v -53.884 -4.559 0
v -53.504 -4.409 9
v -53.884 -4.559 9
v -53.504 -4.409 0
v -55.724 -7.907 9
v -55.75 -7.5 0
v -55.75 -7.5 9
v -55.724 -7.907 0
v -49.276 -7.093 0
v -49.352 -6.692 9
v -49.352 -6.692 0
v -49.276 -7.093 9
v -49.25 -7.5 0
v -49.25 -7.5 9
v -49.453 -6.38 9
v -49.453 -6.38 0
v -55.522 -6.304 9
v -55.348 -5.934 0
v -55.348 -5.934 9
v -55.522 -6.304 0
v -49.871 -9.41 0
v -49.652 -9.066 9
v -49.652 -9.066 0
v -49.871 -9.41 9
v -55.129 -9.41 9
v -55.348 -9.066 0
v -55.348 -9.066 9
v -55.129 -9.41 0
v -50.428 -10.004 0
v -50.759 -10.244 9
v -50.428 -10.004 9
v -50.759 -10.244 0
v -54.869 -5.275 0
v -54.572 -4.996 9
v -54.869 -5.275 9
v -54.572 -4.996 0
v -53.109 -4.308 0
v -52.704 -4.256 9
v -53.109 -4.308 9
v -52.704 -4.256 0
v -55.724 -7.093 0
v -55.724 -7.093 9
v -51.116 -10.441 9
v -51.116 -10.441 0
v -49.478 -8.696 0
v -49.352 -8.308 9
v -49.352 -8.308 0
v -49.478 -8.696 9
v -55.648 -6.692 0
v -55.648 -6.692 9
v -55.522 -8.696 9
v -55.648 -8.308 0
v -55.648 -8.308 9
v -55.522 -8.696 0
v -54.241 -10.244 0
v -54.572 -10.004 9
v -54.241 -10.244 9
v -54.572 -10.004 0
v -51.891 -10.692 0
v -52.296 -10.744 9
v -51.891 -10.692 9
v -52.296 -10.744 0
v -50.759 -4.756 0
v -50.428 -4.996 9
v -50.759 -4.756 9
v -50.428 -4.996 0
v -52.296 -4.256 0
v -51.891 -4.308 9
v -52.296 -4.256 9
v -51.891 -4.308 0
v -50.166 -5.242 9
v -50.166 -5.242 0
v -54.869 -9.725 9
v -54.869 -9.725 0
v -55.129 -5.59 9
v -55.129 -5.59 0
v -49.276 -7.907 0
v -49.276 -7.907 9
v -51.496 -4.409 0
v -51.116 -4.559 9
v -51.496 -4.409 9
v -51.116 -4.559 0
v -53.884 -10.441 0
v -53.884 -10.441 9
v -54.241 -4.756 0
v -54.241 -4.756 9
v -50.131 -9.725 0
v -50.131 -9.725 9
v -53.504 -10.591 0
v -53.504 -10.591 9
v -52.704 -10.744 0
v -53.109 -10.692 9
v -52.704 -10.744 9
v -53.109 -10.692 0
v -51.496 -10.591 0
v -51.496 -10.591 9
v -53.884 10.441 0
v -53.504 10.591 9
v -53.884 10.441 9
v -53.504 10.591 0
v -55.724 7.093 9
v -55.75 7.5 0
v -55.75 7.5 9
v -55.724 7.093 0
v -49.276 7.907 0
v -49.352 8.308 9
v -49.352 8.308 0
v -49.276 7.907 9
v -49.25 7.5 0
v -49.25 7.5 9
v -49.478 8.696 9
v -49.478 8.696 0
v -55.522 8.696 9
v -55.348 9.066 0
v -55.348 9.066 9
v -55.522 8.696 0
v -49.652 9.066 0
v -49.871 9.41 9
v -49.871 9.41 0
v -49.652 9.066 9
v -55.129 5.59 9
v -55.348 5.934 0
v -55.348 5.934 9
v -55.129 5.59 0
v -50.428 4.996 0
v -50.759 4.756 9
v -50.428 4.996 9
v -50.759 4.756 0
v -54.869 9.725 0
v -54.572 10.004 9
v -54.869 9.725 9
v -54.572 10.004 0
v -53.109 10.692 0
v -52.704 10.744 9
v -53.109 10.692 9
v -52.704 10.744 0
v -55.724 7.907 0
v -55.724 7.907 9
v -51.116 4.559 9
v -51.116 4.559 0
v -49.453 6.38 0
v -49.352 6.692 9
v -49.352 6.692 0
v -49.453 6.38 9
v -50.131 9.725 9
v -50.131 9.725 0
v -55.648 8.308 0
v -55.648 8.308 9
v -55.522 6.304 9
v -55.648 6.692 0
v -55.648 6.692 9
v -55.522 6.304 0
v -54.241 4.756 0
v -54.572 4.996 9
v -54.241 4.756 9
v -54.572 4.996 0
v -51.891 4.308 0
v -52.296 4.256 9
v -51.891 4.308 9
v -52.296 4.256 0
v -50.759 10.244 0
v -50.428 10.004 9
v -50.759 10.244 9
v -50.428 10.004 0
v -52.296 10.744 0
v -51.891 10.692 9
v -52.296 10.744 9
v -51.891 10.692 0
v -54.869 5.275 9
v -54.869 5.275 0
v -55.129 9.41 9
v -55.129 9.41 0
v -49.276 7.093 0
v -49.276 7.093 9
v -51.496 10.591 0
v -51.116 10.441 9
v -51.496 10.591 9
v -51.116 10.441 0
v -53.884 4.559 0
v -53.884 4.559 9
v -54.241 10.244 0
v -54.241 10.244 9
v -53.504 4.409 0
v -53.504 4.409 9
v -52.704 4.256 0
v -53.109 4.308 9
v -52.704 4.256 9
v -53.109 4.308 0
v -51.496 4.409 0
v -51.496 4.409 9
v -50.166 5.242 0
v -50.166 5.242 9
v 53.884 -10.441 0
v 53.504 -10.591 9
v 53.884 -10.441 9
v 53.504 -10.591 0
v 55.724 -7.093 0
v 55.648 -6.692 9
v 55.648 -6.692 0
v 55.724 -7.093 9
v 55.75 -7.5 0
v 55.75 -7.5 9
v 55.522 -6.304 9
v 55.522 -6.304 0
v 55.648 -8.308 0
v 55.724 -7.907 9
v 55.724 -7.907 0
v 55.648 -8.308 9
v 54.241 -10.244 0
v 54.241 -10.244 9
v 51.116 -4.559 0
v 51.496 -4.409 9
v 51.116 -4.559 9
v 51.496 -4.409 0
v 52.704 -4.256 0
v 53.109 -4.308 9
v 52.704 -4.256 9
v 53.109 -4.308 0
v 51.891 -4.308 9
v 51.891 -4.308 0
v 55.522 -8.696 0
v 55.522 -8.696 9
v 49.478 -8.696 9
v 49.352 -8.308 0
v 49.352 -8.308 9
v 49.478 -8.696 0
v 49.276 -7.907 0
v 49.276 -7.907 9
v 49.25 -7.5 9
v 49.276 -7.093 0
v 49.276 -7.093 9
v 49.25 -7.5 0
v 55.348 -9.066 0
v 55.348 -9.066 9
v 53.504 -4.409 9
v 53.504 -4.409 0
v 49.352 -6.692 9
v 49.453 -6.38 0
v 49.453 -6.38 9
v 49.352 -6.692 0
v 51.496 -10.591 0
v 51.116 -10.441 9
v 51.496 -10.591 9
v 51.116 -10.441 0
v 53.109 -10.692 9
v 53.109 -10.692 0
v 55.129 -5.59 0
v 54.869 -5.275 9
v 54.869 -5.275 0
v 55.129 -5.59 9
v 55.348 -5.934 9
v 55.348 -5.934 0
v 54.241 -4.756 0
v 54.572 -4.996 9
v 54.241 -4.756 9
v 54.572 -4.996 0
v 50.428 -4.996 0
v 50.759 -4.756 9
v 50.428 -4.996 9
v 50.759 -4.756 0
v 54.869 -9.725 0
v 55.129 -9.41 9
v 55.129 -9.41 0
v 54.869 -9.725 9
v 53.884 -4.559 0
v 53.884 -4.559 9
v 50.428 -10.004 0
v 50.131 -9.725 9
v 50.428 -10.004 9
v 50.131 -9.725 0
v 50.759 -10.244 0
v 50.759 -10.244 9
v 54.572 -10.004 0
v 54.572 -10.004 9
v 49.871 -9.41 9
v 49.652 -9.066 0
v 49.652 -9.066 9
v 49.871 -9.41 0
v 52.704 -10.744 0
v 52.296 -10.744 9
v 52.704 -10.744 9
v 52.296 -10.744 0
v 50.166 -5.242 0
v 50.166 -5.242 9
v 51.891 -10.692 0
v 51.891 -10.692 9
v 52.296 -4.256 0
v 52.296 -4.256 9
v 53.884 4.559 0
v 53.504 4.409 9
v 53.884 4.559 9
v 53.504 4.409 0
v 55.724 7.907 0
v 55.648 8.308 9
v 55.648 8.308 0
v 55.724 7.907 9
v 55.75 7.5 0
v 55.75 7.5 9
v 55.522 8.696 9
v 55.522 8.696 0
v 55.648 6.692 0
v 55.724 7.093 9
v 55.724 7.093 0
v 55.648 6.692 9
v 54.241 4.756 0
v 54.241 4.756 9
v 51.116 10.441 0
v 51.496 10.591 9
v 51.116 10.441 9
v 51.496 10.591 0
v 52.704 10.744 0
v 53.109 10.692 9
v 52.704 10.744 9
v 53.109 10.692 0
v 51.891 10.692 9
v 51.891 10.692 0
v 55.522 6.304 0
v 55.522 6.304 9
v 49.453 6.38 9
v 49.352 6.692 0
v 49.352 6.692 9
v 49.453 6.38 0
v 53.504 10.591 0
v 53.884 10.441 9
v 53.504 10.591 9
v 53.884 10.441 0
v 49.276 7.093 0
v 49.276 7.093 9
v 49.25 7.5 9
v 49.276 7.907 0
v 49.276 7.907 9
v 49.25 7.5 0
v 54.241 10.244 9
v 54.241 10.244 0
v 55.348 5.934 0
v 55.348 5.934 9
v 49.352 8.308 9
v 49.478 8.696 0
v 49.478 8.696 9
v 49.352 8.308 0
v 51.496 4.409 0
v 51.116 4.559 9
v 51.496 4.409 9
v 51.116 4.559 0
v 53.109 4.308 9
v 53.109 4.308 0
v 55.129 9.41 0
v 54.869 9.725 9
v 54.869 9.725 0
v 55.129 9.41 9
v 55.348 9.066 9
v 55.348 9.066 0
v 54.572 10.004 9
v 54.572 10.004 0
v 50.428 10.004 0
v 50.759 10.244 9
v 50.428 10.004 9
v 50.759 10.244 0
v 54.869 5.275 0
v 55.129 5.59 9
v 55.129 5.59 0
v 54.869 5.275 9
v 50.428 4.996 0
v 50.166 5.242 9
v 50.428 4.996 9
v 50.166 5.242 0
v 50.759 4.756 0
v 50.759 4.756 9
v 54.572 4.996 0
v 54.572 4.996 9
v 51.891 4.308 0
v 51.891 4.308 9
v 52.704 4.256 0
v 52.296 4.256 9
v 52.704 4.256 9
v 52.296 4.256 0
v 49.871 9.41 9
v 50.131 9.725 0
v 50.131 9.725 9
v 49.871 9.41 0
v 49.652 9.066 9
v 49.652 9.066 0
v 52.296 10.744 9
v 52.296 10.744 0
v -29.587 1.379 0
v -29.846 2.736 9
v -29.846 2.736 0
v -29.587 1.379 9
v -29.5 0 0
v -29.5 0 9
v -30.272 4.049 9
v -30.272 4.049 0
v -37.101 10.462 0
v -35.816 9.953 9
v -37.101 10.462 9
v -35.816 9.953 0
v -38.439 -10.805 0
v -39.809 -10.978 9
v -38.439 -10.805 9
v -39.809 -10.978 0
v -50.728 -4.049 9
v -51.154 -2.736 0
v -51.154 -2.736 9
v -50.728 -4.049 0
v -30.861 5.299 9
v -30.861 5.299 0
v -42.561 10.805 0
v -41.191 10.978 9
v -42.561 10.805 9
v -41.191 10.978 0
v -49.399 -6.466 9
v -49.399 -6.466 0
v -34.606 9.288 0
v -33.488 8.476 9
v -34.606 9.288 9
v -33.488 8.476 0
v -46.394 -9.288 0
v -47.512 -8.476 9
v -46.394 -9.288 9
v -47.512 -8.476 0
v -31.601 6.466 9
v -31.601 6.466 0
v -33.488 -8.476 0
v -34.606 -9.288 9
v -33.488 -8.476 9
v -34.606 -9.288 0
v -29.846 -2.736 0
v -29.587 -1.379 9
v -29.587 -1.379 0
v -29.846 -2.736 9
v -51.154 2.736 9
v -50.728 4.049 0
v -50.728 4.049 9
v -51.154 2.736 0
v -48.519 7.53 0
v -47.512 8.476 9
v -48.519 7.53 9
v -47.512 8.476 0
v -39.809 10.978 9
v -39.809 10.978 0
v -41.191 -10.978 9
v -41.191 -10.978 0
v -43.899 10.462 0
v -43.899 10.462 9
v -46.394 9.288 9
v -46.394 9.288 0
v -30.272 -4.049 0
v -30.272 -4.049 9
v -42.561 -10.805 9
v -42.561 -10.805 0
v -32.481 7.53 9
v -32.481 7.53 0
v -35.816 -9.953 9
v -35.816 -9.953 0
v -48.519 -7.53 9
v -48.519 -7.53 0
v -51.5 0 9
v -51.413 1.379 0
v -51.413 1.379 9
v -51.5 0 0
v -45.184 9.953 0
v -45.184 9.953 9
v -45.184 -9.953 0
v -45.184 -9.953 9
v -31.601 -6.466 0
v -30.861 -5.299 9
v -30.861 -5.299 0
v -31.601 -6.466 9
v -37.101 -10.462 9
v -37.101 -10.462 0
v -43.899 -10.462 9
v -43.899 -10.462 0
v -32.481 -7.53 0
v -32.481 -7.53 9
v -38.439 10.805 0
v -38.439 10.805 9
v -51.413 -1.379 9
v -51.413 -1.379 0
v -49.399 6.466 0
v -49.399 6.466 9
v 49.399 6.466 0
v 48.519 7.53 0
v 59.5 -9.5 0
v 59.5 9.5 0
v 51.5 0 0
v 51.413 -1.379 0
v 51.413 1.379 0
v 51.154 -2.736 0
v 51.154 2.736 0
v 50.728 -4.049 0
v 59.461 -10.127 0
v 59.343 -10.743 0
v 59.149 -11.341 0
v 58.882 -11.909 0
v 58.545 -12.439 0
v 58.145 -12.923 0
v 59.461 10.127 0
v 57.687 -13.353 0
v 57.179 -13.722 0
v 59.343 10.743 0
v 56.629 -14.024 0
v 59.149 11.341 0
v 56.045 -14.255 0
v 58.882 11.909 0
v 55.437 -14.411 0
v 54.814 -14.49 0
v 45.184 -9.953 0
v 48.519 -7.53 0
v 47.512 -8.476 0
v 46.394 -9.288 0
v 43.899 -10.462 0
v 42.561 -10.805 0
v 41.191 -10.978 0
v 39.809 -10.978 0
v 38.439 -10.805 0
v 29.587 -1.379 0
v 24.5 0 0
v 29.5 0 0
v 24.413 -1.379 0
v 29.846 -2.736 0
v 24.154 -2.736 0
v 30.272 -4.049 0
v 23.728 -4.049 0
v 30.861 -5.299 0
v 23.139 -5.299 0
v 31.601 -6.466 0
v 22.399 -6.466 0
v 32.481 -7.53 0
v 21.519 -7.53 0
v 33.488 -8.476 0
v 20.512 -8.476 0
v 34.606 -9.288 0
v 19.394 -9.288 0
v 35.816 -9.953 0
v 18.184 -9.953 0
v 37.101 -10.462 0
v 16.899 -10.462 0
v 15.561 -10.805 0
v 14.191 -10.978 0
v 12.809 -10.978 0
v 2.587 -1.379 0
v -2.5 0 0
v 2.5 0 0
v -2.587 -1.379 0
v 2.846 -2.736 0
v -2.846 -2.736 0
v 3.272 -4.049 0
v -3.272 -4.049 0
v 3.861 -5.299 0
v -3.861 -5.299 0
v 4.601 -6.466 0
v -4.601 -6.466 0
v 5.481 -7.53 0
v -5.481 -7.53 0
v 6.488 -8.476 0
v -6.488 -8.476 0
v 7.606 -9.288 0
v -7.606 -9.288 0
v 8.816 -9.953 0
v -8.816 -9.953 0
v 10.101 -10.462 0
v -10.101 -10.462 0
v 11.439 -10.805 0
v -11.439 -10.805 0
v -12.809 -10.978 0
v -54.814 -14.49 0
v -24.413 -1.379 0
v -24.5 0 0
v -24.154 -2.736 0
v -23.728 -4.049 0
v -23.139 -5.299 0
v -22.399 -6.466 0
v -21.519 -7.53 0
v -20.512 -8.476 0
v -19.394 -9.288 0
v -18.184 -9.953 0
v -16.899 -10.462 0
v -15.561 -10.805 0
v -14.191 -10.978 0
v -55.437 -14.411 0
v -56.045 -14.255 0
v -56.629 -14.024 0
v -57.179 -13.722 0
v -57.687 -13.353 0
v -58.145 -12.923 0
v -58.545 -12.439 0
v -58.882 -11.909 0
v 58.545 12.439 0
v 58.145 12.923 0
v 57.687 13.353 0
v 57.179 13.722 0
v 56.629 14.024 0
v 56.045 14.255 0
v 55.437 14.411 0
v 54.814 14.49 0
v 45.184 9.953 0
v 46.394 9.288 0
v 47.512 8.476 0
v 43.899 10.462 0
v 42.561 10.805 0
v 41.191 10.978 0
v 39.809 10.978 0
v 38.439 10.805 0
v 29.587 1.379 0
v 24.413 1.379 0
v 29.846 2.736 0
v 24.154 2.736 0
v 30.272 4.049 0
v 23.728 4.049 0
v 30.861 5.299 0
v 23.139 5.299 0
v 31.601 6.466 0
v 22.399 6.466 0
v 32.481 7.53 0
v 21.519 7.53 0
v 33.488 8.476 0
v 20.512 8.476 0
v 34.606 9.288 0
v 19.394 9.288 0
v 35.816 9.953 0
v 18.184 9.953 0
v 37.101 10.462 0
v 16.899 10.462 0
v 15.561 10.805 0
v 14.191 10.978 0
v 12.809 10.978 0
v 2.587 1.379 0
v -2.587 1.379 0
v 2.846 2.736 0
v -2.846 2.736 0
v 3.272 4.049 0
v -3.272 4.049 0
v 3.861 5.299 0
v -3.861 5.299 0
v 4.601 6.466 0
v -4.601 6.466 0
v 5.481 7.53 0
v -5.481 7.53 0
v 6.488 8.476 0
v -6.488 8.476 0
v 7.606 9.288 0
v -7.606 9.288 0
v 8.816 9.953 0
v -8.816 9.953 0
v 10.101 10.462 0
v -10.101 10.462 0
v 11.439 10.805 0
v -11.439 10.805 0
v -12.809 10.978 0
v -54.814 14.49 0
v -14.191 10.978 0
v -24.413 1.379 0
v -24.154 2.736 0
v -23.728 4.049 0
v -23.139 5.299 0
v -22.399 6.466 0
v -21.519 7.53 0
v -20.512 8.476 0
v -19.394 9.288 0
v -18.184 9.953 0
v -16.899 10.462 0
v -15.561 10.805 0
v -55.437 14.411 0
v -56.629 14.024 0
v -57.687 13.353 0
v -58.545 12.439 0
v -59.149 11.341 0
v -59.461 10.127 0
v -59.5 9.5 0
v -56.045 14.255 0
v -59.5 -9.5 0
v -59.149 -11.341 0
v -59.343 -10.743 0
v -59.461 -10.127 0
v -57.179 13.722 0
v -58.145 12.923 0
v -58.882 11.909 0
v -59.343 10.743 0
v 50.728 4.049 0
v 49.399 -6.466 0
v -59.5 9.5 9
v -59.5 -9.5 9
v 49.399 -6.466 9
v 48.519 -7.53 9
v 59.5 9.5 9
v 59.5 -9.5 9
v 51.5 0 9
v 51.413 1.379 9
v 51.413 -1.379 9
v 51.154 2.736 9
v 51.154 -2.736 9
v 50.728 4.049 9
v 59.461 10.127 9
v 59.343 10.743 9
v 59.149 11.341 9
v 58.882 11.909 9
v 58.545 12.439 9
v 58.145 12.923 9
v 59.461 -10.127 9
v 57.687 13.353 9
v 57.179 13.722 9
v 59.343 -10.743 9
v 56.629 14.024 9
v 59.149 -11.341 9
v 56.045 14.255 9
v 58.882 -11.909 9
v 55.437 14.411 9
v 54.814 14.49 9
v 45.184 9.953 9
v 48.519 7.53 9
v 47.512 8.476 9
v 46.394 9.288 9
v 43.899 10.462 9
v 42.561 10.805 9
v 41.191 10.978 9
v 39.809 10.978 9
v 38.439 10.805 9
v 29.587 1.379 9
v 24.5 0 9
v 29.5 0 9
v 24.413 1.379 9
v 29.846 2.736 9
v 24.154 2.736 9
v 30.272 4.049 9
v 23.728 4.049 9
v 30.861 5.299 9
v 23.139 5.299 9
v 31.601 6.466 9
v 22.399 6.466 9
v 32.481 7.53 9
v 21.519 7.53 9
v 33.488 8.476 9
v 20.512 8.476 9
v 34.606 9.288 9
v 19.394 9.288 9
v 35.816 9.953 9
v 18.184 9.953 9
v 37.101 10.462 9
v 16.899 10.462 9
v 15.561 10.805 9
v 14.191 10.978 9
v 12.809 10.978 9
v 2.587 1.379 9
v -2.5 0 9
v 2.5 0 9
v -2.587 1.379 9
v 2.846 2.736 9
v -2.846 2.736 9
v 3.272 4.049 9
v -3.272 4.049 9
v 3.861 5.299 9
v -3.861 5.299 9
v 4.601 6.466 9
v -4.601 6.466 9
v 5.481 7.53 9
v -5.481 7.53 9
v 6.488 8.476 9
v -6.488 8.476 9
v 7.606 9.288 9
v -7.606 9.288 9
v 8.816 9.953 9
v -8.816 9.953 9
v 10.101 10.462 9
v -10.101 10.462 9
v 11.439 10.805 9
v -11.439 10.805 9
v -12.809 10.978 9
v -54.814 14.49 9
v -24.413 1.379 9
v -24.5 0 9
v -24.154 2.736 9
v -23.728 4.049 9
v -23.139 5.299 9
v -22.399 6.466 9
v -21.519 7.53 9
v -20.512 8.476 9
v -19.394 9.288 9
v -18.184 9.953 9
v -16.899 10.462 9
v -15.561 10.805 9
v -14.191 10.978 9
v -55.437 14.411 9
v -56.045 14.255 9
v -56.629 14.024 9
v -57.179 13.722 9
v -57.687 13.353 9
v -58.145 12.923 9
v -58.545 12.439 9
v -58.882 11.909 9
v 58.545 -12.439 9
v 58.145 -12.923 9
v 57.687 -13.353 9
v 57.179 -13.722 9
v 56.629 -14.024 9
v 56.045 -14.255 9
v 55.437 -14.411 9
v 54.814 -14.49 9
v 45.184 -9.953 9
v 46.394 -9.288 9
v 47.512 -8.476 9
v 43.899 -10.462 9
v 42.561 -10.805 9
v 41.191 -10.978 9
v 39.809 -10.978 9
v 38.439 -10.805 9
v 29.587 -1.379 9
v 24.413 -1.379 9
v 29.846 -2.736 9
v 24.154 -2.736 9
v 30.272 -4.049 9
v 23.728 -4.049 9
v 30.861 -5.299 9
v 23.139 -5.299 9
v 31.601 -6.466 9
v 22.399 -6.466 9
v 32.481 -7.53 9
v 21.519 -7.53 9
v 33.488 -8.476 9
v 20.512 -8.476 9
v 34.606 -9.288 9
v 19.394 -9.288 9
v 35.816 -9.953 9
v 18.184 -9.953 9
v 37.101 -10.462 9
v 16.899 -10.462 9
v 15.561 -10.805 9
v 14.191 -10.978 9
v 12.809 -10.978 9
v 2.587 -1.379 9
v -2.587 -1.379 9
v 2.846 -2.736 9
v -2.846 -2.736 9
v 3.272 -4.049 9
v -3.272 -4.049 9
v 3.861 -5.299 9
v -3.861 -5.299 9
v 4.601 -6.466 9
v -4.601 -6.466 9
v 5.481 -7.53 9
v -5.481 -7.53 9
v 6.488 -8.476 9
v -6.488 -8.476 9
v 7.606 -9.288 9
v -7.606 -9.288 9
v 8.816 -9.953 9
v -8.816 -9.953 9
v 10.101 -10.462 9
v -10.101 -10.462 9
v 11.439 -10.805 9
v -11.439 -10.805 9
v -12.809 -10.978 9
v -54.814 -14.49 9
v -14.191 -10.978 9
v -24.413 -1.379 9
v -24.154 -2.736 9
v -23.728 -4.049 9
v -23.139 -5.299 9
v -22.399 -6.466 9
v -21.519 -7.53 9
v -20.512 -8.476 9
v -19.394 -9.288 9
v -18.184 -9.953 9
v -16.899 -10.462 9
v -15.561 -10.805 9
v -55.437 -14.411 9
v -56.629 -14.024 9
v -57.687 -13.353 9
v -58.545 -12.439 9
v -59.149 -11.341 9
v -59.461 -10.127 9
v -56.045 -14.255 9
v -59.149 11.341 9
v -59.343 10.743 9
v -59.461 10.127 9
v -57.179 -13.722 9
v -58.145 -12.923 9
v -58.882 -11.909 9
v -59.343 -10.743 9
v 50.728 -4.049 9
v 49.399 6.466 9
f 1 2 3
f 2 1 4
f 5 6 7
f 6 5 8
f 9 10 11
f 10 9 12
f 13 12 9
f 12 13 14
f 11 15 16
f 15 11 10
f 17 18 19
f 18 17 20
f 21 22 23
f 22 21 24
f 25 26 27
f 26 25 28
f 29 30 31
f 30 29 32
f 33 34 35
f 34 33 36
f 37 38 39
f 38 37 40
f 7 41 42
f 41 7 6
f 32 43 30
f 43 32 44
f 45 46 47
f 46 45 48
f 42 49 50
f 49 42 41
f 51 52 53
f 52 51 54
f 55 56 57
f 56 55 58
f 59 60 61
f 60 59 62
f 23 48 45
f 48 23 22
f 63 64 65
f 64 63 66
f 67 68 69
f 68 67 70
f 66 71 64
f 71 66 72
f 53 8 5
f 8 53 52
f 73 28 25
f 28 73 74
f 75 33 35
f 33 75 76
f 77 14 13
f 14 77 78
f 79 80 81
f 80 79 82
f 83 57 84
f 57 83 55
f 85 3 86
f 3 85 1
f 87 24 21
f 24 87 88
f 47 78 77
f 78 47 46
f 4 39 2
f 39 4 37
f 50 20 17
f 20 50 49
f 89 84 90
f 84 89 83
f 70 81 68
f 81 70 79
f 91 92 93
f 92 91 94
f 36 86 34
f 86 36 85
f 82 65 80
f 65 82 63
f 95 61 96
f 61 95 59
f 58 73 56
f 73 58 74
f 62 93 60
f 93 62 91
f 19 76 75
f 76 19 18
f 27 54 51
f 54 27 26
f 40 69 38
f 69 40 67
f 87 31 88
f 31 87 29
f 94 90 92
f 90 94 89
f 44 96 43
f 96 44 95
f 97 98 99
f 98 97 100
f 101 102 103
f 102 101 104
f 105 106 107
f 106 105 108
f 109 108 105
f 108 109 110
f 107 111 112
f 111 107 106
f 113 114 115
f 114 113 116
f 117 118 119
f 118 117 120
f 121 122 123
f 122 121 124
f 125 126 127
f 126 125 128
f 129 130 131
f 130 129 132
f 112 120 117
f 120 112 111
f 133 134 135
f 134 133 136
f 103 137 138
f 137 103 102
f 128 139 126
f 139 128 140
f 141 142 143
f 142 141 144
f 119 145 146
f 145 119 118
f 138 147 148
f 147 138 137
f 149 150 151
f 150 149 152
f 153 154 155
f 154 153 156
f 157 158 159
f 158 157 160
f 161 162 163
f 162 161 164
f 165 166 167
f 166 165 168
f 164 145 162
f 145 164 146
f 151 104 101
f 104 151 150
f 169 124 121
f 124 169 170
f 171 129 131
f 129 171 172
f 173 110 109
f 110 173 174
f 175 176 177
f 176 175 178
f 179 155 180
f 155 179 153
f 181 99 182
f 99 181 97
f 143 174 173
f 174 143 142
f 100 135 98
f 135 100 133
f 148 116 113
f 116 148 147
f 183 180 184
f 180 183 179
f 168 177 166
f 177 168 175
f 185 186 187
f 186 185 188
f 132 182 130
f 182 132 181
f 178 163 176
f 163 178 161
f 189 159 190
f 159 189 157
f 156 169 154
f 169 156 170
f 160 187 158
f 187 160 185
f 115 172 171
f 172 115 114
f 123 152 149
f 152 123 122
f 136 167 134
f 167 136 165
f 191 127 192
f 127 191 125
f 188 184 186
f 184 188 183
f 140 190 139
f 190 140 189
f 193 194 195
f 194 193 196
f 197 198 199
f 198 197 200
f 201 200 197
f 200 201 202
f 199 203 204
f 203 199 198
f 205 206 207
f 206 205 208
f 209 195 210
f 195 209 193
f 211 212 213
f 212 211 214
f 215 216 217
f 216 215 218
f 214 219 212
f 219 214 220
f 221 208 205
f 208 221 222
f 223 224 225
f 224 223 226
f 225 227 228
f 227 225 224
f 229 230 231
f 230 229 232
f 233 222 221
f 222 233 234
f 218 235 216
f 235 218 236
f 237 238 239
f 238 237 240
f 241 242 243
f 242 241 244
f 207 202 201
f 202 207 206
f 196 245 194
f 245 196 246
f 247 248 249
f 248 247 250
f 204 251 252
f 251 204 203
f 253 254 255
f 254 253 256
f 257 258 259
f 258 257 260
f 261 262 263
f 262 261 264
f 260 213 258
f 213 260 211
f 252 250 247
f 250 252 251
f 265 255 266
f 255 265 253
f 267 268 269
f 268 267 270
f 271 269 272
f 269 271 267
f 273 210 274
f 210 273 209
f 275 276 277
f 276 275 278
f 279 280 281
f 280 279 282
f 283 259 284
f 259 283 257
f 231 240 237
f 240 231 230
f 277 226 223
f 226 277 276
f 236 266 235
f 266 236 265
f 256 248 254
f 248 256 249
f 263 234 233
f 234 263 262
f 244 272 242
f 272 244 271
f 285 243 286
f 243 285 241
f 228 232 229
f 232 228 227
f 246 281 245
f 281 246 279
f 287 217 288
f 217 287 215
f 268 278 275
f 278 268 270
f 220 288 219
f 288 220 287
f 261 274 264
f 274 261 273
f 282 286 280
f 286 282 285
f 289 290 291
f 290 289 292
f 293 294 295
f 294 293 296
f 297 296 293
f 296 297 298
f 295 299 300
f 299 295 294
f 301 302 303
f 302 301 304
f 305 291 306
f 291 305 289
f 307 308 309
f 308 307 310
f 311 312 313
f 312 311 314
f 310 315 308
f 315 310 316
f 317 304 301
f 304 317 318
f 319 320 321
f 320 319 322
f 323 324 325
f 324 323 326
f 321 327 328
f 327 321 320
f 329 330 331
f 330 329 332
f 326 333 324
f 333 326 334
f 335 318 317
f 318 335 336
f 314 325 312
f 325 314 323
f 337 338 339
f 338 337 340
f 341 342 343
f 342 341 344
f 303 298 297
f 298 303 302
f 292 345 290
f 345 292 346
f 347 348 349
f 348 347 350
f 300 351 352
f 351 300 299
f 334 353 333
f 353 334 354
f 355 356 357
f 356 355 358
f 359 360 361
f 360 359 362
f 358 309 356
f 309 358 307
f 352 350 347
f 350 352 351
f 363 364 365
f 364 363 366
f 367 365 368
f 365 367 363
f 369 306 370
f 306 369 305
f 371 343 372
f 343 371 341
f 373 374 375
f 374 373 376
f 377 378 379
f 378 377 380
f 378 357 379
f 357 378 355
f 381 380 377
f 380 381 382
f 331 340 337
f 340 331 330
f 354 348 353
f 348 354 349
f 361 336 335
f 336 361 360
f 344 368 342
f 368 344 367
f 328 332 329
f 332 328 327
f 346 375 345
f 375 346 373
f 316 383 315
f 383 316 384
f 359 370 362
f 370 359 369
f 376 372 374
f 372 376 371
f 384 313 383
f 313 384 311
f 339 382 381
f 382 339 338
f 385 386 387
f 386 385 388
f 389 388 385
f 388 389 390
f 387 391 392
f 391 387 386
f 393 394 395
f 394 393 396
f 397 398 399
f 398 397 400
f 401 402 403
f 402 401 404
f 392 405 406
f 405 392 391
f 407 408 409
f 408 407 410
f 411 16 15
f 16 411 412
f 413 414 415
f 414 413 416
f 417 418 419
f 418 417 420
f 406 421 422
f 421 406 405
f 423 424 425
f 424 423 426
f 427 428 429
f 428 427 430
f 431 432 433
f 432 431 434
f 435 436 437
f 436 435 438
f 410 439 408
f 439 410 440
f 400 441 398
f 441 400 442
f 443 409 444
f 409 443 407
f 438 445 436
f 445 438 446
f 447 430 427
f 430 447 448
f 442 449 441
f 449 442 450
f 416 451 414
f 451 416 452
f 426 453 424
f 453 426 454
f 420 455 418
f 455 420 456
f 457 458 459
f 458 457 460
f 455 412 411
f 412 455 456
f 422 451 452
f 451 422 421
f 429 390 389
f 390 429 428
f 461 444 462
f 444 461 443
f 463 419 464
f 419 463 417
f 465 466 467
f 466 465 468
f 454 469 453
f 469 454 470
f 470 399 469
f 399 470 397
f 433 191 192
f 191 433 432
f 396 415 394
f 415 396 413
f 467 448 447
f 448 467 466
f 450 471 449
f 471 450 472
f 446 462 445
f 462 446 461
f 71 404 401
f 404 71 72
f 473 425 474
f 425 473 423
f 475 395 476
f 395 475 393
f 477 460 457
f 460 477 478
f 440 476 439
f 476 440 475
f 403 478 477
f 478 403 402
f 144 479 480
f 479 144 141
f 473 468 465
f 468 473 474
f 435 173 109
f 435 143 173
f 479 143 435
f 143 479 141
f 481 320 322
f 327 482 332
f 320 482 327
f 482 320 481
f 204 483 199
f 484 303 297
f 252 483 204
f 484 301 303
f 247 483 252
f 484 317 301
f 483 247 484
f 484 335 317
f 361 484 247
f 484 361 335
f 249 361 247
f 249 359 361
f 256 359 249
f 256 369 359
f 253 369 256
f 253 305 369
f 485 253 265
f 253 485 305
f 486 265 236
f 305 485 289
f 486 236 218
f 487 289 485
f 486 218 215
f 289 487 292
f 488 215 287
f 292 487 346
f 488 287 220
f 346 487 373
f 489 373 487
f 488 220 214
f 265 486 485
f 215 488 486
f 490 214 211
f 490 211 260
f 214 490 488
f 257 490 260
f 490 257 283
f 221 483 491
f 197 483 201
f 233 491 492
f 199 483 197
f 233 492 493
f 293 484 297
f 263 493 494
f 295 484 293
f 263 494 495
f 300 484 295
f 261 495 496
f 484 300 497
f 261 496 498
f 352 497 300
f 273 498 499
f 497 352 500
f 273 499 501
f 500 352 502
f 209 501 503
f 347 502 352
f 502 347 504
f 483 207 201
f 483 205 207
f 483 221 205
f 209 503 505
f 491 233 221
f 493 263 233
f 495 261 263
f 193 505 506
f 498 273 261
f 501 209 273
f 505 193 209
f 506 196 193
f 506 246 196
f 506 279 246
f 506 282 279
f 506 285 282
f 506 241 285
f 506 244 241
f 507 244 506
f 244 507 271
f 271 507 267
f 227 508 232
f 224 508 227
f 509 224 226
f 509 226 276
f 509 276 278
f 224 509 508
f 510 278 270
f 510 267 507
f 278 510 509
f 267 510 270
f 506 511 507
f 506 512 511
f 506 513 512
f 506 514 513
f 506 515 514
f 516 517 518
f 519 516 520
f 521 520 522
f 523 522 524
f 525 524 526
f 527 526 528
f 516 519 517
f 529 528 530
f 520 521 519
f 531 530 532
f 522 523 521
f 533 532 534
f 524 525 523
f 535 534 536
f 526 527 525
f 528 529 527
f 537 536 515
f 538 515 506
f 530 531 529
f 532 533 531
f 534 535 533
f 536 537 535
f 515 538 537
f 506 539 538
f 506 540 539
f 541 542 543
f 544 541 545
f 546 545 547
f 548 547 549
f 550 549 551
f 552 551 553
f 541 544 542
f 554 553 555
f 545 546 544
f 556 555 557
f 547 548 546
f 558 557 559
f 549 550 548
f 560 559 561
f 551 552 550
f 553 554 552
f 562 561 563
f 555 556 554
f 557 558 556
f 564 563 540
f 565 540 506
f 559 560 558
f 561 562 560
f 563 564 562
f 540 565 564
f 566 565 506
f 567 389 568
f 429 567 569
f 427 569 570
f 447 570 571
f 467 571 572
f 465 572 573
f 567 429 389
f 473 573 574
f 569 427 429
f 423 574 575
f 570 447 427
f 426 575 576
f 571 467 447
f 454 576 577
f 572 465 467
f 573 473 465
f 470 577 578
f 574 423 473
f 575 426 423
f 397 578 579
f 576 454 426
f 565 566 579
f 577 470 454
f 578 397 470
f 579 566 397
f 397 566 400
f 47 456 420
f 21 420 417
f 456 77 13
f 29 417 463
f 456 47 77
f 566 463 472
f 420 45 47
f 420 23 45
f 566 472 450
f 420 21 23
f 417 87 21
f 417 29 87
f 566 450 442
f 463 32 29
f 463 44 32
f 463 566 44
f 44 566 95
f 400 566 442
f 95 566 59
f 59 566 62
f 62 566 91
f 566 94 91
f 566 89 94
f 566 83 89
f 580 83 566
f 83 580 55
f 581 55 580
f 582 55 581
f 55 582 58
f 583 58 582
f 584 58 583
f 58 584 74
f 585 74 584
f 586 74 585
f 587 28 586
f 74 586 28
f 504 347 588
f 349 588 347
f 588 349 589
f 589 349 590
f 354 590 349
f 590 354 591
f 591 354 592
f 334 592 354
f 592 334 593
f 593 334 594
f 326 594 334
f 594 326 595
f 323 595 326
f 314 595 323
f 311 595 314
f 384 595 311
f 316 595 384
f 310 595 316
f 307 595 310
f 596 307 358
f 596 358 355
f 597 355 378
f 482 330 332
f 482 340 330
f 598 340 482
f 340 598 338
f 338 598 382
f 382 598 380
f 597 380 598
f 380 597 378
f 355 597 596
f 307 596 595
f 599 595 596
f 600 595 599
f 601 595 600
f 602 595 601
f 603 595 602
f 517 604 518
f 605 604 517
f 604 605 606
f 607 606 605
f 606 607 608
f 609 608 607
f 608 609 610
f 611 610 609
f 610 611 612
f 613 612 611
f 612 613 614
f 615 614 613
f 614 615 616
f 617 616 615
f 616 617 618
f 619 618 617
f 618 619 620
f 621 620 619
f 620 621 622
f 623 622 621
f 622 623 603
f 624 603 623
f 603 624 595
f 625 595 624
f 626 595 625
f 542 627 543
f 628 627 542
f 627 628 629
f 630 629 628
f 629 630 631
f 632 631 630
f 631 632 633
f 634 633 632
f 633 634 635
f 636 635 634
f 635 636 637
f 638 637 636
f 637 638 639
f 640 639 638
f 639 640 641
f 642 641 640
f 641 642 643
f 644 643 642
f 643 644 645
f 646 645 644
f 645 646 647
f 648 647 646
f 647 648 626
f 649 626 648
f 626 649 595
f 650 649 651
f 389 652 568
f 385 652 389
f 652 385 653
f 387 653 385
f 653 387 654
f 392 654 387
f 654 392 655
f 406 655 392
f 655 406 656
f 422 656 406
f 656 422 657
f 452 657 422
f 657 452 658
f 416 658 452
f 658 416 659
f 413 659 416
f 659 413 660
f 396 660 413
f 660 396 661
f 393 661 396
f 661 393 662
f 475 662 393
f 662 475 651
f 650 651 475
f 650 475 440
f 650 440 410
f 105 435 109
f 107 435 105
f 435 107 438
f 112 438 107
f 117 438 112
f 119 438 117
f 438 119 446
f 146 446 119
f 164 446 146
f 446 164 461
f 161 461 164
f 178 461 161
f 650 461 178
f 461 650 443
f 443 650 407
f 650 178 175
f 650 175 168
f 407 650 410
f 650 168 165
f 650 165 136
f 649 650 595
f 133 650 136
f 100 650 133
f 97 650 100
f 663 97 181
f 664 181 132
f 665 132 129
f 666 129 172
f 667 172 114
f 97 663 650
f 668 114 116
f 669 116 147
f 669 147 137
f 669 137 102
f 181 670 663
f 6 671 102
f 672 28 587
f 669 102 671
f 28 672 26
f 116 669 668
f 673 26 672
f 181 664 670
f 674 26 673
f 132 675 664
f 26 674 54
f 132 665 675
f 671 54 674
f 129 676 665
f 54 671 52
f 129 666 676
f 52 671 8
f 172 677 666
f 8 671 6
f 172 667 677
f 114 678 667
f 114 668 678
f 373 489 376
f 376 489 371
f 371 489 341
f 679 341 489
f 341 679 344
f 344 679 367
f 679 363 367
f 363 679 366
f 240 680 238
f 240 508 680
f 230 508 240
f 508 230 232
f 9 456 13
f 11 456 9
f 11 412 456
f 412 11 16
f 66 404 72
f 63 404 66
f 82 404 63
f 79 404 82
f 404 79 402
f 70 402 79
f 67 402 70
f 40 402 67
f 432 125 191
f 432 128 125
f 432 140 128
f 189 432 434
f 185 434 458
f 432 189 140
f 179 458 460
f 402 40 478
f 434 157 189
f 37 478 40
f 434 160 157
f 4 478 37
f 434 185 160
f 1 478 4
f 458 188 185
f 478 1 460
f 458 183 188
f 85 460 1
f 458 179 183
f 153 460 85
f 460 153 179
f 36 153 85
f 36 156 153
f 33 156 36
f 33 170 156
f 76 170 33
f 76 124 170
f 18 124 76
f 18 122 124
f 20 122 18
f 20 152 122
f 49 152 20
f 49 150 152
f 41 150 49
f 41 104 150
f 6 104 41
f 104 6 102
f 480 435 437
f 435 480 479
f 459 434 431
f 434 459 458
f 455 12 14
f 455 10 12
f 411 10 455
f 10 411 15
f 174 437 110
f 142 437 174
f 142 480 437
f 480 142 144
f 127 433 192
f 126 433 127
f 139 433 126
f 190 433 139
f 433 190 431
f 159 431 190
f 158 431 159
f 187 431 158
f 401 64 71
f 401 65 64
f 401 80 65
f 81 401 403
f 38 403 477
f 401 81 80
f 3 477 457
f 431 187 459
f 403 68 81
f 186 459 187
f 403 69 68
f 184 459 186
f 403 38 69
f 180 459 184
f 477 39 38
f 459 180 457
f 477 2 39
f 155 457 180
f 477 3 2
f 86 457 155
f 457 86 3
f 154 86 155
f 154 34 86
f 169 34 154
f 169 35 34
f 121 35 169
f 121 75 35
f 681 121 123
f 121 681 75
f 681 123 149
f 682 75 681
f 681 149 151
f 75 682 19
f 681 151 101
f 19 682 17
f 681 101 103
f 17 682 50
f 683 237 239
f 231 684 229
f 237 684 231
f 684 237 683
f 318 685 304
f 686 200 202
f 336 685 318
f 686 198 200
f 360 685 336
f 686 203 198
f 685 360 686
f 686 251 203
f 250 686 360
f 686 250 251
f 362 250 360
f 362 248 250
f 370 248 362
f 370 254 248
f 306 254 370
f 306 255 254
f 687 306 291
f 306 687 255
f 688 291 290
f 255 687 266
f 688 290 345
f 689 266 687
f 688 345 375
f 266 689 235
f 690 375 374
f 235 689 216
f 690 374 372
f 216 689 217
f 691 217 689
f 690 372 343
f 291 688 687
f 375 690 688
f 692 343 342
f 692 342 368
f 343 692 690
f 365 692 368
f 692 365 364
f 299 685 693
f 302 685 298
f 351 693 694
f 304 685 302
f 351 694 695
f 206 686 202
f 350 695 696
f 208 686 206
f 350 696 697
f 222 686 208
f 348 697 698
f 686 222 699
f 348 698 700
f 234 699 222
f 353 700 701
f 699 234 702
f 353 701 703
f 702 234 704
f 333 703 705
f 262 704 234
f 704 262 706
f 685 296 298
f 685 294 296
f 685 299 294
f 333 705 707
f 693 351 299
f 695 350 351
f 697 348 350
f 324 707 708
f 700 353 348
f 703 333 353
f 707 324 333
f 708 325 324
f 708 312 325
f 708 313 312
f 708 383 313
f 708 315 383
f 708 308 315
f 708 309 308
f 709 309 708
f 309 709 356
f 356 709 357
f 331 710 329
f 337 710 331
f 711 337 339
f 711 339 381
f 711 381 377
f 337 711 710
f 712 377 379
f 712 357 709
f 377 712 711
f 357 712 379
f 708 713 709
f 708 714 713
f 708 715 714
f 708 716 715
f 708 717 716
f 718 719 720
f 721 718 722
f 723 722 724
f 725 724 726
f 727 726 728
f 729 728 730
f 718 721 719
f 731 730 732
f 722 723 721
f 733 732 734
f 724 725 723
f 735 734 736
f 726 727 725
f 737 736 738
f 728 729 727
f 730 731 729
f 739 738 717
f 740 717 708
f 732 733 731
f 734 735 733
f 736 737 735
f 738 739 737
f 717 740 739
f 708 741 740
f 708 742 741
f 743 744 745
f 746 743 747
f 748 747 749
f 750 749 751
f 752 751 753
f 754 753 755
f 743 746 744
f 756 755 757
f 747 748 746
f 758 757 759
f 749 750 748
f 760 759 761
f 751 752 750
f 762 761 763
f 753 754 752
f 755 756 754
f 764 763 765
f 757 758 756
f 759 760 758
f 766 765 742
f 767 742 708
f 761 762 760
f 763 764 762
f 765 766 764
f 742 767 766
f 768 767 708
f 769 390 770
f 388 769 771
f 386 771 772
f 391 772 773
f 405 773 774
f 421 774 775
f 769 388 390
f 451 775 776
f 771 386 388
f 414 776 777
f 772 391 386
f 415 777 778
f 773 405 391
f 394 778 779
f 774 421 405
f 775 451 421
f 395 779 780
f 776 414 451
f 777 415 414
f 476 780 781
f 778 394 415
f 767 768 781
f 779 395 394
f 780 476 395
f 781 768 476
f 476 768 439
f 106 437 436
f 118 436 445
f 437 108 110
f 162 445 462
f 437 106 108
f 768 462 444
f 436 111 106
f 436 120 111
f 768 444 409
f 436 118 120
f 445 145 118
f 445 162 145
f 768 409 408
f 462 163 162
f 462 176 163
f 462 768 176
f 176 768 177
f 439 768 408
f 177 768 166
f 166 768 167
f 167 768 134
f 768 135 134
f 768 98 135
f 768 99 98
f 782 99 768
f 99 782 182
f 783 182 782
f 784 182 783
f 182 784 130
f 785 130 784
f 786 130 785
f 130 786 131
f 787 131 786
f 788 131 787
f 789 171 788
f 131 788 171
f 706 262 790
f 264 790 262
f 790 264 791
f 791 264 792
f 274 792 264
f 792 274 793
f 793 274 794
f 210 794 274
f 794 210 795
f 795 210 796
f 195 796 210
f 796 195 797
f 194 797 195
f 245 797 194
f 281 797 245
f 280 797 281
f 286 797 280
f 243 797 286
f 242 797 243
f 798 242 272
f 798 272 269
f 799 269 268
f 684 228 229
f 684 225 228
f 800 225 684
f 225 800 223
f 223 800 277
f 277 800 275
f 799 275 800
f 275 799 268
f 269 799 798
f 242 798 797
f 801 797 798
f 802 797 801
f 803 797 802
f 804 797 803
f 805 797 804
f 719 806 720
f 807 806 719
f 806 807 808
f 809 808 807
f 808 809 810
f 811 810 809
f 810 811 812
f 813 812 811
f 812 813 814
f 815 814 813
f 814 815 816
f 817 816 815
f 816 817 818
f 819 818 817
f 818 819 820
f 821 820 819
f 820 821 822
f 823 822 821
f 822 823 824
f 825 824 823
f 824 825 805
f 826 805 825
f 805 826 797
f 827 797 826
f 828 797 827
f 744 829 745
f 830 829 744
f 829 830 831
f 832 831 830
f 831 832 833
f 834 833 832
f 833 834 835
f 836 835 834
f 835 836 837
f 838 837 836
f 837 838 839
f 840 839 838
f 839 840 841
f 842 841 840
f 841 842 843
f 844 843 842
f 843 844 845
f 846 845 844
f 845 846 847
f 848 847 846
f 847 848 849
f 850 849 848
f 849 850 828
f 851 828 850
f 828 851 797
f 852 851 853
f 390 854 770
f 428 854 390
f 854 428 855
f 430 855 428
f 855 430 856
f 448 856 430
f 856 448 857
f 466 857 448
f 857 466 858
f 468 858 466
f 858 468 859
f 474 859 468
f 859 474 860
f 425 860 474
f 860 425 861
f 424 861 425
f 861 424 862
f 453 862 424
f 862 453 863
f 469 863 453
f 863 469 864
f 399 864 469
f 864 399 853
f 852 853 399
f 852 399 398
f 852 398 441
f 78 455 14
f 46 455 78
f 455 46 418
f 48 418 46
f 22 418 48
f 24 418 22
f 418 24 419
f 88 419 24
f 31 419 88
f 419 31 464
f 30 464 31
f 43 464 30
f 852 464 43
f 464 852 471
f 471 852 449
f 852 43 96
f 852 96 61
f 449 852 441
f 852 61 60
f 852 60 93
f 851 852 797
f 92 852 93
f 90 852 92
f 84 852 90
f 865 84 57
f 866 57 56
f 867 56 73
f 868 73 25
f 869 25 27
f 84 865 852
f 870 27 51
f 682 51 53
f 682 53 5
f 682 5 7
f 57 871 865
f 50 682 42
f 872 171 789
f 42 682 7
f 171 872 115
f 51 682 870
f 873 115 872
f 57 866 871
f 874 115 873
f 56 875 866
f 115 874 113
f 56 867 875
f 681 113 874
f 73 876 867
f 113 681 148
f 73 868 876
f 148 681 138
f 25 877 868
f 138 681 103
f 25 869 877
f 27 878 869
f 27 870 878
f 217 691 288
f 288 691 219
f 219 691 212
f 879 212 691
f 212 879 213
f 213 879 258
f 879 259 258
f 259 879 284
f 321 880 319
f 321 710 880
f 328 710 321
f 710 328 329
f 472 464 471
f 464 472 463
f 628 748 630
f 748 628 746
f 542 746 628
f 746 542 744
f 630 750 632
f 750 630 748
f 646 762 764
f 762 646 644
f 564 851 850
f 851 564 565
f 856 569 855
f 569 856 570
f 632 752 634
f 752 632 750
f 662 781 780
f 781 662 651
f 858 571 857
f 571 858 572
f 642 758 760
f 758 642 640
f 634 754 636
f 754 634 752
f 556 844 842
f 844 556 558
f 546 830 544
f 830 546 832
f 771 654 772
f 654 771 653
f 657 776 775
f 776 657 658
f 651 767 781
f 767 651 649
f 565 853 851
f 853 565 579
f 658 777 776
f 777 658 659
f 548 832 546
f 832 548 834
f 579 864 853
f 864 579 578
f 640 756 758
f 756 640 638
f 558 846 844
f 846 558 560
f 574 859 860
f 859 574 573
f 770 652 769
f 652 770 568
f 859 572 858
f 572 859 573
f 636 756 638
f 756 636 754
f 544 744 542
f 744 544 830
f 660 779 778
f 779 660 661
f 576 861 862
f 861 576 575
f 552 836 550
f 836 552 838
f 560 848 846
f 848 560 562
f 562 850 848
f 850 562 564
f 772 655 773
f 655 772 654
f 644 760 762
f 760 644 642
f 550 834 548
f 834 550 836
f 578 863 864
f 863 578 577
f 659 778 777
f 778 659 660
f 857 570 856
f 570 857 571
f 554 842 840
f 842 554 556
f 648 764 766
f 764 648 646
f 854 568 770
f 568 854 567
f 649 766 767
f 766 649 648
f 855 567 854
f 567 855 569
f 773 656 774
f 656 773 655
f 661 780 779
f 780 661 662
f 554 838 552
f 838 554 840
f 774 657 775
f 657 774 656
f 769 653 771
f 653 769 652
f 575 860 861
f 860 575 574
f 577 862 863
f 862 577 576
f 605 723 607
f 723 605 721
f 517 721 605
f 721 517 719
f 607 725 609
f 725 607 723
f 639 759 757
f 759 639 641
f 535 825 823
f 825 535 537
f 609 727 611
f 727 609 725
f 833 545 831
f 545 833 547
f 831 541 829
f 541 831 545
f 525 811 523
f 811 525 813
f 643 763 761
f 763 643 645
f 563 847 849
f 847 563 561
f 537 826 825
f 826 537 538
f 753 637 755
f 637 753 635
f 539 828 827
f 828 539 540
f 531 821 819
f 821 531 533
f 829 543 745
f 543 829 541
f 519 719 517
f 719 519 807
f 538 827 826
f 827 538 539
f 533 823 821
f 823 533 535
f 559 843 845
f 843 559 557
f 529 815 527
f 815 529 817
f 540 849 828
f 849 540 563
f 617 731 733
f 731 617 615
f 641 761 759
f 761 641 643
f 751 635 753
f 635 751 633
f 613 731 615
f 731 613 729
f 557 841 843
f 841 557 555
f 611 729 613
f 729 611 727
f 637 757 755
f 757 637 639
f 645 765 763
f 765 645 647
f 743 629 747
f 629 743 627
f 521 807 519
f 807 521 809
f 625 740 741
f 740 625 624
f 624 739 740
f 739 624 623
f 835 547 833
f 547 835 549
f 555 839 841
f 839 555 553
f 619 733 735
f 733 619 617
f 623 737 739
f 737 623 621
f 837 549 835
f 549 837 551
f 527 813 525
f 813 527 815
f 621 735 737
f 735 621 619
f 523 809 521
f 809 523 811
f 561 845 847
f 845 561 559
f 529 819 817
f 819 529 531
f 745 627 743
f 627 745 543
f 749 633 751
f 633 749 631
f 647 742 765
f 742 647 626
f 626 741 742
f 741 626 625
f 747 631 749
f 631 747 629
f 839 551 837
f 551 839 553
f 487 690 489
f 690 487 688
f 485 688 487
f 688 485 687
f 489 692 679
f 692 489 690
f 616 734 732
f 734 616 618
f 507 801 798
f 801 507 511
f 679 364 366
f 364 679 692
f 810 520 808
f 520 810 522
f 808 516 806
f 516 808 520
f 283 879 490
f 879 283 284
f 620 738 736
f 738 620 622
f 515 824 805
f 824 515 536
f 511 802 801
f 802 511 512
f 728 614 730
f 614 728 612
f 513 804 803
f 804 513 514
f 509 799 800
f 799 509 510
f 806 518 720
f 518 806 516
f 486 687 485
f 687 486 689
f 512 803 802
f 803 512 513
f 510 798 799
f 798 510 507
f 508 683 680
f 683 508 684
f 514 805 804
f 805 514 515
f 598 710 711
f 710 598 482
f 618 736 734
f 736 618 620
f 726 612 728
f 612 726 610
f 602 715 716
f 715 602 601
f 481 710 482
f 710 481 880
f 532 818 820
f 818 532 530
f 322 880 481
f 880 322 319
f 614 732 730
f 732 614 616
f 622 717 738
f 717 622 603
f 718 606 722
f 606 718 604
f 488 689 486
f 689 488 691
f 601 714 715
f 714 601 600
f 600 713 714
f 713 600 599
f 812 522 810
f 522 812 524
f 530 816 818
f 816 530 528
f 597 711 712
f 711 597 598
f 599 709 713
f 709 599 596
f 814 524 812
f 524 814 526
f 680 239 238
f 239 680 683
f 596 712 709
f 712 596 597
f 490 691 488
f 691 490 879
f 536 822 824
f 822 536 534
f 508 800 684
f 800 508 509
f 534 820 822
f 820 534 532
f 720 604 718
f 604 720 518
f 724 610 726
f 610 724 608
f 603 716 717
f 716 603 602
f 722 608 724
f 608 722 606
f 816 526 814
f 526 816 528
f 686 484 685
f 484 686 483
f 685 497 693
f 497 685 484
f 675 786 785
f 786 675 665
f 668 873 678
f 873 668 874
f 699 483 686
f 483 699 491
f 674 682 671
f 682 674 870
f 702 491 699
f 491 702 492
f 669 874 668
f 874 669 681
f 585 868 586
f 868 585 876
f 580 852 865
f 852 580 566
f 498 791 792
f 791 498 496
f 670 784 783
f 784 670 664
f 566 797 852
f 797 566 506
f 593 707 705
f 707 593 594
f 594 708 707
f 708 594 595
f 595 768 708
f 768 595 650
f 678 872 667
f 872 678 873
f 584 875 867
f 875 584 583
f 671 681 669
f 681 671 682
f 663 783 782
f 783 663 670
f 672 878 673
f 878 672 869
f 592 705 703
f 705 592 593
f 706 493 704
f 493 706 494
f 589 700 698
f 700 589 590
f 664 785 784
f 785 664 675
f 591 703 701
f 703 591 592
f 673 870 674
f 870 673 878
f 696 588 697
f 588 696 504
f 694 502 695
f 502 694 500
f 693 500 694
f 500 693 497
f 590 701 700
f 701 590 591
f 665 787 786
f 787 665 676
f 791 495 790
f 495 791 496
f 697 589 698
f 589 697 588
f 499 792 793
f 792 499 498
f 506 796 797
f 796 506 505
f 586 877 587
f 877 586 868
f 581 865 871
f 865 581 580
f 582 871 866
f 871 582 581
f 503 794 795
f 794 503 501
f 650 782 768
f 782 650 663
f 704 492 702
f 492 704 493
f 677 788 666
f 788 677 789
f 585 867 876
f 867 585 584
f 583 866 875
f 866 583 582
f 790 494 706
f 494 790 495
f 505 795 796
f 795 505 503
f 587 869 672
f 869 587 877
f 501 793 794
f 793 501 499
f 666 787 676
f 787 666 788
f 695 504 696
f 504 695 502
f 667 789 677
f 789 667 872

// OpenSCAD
$fn = 50;

difference() {
	union() {
		hull() {
			translate(v = [-54.5, 9.5, 0]) {
				cylinder(h = 9, r = 5);
			}
			translate(v = [54.5, 9.5, 0]) {
				cylinder(h = 9, r = 5);
			}
			translate(v = [-54.5, -9.5, 0]) {
				cylinder(h = 9, r = 5);
			}
			translate(v = [54.5, -9.5, 0]) {
				cylinder(h = 9, r = 5);
			}
		}
	}
	union() {
		translate(v = [-52.5, -7.5, -100.0]) {
			cylinder(h = 200, r = 3.25);
		}
		translate(v = [-52.5, 7.5, -100.0]) {
			cylinder(h = 200, r = 3.25);
		}
		translate(v = [52.5, -7.5, -100.0]) {
			cylinder(h = 200, r = 3.25);
		}
		translate(v = [52.5, 7.5, -100.0]) {
			cylinder(h = 200, r = 3.25);
		}
		translate(v = [-52.5, -7.5, -100.0]) {
			cylinder(h = 200, r = 1.8);
		}
		translate(v = [-52.5, 7.5, -100.0]) {
			cylinder(h = 200, r = 1.8);
		}
		translate(v = [52.5, -7.5, -100.0]) {
			cylinder(h = 200, r = 1.8);
		}
		translate(v = [52.5, 7.5, -100.0]) {
			cylinder(h = 200, r = 1.8);
		}
		translate(v = [-40.5, 0, 0.0]) {
			cylinder(h = 9, r = 11.0);
		}
		translate(v = [-13.5, 0, 0.0]) {
			cylinder(h = 9, r = 11.0);
		}
		translate(v = [13.5, 0, 0.0]) {
			cylinder(h = 9, r = 11.0);
		}
		translate(v = [40.5, 0, 0.0]) {
			cylinder(h = 9, r = 11.0);
		}
	}
}
